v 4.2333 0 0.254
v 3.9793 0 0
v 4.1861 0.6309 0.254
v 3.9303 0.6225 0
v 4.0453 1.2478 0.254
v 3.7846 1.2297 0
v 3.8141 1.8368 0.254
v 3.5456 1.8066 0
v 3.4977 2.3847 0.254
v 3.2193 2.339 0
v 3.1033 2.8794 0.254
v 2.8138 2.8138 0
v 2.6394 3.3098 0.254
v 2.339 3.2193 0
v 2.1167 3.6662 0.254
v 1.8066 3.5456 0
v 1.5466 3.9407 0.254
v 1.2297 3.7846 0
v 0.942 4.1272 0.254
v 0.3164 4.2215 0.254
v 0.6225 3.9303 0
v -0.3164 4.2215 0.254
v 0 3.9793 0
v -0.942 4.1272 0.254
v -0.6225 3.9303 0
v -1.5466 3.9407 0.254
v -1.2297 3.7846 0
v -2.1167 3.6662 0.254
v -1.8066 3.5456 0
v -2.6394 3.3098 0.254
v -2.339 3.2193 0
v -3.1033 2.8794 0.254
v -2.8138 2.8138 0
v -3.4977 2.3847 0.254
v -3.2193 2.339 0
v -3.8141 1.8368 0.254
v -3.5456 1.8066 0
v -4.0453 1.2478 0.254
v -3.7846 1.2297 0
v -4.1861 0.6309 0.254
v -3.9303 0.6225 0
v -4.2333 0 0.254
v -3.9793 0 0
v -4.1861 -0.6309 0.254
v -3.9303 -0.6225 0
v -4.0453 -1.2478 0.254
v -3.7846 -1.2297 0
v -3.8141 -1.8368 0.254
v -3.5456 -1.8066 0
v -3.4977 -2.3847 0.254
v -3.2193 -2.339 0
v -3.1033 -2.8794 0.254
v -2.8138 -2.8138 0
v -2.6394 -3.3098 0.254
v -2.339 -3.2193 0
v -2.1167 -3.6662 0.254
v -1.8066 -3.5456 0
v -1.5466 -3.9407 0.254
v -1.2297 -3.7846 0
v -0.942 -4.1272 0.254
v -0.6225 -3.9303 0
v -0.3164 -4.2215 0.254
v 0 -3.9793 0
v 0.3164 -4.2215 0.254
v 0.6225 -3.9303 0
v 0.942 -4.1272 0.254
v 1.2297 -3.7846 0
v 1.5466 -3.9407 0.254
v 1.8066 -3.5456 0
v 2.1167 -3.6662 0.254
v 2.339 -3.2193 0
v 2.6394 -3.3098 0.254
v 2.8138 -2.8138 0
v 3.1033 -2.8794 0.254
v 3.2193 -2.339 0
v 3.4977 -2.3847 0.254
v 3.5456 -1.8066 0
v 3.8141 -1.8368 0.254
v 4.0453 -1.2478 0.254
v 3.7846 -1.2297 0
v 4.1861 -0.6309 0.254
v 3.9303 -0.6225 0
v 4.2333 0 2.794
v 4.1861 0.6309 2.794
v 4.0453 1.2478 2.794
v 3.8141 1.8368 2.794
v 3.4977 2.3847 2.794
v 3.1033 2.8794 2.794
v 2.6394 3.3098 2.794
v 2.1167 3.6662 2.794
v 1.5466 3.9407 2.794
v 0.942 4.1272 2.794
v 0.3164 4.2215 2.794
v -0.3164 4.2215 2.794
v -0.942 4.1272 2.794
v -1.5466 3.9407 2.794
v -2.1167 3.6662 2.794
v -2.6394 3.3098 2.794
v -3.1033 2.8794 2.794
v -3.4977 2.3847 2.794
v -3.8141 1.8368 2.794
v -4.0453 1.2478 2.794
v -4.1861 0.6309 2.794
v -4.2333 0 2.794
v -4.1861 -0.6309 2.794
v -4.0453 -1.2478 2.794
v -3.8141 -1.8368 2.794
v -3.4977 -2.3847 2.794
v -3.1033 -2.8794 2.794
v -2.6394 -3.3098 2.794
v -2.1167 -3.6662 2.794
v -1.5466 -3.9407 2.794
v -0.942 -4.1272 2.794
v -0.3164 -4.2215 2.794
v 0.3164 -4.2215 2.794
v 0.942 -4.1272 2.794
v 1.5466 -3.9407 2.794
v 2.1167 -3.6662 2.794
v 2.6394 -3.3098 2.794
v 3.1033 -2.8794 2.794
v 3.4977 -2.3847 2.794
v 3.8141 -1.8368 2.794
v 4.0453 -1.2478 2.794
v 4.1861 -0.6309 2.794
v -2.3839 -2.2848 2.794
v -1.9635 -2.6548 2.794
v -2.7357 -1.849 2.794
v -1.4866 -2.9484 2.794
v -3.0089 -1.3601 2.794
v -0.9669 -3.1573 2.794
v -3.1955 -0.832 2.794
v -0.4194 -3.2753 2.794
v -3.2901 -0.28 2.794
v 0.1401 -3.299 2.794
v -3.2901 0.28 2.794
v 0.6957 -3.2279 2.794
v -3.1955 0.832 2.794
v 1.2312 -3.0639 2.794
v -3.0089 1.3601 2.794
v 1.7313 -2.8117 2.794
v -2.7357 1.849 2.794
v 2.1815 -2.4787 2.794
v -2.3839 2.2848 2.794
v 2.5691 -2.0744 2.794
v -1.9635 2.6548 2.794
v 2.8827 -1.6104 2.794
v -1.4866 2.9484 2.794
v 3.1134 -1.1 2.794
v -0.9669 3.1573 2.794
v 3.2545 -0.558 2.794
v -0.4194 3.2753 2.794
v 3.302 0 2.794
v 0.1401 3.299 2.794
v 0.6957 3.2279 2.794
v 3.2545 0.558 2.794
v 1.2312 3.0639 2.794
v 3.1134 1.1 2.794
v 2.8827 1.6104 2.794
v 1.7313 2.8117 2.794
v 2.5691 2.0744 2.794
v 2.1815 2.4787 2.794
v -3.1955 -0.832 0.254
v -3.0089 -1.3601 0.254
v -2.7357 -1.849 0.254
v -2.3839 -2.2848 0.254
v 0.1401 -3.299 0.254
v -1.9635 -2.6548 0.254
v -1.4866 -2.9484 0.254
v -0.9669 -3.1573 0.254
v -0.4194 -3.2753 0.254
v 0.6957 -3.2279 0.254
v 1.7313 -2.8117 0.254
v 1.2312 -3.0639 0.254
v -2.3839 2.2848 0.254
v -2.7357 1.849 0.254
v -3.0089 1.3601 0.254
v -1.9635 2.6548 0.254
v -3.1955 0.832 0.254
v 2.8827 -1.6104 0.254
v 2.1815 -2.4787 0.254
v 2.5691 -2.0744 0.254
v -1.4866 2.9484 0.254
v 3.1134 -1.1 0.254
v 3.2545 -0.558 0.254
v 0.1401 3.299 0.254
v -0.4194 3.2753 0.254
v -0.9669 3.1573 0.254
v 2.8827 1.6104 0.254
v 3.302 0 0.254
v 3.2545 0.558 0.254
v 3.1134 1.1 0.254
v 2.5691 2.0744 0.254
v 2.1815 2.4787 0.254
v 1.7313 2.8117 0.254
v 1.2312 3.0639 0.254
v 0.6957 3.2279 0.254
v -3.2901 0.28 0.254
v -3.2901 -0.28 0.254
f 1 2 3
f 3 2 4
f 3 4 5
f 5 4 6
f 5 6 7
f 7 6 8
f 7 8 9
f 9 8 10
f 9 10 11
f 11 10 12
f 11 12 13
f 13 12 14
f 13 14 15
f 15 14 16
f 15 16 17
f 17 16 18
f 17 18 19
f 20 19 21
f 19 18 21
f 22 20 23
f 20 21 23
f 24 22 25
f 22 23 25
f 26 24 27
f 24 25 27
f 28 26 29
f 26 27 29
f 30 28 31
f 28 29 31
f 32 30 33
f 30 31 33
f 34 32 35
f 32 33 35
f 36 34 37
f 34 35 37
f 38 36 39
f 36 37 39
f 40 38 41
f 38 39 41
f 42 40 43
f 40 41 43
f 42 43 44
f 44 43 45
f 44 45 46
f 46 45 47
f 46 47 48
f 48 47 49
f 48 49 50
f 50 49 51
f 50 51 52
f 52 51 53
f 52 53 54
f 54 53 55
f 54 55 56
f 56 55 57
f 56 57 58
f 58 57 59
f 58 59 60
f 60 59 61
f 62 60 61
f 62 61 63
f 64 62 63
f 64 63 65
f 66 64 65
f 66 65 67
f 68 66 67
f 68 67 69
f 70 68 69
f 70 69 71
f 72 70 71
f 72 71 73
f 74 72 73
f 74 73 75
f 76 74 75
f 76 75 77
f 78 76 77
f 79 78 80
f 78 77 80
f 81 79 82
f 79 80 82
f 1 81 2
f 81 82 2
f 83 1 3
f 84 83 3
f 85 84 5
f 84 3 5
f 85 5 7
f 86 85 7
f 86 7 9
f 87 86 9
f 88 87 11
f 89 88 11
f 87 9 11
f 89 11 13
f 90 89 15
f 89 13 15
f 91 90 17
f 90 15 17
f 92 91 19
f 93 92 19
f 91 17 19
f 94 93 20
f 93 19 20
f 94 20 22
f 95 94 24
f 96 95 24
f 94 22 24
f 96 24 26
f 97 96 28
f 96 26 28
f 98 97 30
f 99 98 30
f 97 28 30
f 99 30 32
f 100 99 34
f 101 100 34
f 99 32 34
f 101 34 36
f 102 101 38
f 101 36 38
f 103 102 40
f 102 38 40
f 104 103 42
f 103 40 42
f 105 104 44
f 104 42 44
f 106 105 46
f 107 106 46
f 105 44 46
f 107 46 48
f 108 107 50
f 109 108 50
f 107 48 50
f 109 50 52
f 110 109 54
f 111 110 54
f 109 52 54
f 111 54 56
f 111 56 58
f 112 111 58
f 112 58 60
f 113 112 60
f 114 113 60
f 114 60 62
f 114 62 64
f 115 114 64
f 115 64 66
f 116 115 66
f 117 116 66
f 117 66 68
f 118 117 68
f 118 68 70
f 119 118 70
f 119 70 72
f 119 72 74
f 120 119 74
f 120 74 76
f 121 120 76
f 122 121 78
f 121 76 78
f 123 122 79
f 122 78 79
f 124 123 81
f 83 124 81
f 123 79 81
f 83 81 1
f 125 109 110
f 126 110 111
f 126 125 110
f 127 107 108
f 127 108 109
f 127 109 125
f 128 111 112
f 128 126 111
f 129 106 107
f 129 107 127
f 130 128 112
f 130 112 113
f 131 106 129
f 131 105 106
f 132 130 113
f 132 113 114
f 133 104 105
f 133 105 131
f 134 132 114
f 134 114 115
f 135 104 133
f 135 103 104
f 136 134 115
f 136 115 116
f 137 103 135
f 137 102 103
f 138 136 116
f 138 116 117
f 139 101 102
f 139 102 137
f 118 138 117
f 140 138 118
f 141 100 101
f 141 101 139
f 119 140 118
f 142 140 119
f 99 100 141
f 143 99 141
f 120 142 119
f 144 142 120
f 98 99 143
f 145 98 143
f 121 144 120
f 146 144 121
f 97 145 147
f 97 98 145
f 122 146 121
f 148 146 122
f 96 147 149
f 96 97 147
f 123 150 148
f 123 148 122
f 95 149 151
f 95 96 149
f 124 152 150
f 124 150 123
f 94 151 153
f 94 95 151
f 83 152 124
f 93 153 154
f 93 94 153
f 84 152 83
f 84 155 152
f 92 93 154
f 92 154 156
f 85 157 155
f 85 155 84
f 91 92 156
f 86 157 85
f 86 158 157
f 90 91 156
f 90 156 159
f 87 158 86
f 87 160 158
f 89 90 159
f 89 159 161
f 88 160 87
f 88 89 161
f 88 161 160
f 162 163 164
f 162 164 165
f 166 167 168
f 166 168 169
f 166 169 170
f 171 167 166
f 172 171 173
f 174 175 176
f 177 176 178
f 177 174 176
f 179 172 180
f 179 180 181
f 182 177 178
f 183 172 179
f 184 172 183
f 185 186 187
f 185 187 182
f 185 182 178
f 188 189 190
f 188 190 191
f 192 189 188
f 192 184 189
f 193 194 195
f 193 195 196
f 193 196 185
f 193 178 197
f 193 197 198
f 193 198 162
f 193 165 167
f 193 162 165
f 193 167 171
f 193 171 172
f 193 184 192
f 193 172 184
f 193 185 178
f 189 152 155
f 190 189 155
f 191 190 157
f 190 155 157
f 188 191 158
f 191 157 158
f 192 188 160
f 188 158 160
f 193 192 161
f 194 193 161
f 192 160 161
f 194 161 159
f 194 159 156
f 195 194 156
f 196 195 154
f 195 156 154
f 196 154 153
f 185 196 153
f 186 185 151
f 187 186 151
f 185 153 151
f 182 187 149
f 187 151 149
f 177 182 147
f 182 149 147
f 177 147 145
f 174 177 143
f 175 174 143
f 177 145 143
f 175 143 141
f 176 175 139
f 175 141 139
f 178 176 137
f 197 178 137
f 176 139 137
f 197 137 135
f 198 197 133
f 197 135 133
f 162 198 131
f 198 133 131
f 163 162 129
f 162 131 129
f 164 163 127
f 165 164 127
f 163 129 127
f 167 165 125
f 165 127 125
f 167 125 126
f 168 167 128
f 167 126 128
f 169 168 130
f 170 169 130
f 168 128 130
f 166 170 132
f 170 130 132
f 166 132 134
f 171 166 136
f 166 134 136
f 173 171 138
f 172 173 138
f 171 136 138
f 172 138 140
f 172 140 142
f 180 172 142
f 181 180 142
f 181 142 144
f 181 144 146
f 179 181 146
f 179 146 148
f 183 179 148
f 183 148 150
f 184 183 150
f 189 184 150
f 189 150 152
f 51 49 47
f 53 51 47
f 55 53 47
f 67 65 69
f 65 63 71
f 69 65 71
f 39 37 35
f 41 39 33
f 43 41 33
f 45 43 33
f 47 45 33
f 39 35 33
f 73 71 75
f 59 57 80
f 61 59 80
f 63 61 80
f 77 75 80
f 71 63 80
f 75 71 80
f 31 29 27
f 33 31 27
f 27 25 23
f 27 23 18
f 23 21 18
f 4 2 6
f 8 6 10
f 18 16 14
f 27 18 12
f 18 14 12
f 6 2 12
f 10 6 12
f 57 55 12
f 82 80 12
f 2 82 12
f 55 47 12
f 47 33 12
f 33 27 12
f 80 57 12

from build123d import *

# Parameters (mm, degrees)
F0_R     = 4.233333
F1_DEPTH = 2.794
F2_R     = 3.302
F3_DEPTH = 2.54
F4_SIZE  = 0.254


with BuildPart() as f1:
    # F0 (on Top) → F1 (new body)
    with BuildSketch(Plane.XY):
        Circle(F0_R)
    extrude(amount=F1_DEPTH)

    # F2 (on face) → F3 (cut)
    with BuildSketch(Plane.XY.offset(2.794)):
        Circle(F2_R)
    extrude(amount=-F3_DEPTH, mode=Mode.SUBTRACT)

    # F4
    f4_edges = [f1.edges().sort_by_distance(p)[0] for p in [
        (-4.233333, 0, 0),
    ]]
    chamfer(f4_edges, length=F4_SIZE)


solid = f1.part
